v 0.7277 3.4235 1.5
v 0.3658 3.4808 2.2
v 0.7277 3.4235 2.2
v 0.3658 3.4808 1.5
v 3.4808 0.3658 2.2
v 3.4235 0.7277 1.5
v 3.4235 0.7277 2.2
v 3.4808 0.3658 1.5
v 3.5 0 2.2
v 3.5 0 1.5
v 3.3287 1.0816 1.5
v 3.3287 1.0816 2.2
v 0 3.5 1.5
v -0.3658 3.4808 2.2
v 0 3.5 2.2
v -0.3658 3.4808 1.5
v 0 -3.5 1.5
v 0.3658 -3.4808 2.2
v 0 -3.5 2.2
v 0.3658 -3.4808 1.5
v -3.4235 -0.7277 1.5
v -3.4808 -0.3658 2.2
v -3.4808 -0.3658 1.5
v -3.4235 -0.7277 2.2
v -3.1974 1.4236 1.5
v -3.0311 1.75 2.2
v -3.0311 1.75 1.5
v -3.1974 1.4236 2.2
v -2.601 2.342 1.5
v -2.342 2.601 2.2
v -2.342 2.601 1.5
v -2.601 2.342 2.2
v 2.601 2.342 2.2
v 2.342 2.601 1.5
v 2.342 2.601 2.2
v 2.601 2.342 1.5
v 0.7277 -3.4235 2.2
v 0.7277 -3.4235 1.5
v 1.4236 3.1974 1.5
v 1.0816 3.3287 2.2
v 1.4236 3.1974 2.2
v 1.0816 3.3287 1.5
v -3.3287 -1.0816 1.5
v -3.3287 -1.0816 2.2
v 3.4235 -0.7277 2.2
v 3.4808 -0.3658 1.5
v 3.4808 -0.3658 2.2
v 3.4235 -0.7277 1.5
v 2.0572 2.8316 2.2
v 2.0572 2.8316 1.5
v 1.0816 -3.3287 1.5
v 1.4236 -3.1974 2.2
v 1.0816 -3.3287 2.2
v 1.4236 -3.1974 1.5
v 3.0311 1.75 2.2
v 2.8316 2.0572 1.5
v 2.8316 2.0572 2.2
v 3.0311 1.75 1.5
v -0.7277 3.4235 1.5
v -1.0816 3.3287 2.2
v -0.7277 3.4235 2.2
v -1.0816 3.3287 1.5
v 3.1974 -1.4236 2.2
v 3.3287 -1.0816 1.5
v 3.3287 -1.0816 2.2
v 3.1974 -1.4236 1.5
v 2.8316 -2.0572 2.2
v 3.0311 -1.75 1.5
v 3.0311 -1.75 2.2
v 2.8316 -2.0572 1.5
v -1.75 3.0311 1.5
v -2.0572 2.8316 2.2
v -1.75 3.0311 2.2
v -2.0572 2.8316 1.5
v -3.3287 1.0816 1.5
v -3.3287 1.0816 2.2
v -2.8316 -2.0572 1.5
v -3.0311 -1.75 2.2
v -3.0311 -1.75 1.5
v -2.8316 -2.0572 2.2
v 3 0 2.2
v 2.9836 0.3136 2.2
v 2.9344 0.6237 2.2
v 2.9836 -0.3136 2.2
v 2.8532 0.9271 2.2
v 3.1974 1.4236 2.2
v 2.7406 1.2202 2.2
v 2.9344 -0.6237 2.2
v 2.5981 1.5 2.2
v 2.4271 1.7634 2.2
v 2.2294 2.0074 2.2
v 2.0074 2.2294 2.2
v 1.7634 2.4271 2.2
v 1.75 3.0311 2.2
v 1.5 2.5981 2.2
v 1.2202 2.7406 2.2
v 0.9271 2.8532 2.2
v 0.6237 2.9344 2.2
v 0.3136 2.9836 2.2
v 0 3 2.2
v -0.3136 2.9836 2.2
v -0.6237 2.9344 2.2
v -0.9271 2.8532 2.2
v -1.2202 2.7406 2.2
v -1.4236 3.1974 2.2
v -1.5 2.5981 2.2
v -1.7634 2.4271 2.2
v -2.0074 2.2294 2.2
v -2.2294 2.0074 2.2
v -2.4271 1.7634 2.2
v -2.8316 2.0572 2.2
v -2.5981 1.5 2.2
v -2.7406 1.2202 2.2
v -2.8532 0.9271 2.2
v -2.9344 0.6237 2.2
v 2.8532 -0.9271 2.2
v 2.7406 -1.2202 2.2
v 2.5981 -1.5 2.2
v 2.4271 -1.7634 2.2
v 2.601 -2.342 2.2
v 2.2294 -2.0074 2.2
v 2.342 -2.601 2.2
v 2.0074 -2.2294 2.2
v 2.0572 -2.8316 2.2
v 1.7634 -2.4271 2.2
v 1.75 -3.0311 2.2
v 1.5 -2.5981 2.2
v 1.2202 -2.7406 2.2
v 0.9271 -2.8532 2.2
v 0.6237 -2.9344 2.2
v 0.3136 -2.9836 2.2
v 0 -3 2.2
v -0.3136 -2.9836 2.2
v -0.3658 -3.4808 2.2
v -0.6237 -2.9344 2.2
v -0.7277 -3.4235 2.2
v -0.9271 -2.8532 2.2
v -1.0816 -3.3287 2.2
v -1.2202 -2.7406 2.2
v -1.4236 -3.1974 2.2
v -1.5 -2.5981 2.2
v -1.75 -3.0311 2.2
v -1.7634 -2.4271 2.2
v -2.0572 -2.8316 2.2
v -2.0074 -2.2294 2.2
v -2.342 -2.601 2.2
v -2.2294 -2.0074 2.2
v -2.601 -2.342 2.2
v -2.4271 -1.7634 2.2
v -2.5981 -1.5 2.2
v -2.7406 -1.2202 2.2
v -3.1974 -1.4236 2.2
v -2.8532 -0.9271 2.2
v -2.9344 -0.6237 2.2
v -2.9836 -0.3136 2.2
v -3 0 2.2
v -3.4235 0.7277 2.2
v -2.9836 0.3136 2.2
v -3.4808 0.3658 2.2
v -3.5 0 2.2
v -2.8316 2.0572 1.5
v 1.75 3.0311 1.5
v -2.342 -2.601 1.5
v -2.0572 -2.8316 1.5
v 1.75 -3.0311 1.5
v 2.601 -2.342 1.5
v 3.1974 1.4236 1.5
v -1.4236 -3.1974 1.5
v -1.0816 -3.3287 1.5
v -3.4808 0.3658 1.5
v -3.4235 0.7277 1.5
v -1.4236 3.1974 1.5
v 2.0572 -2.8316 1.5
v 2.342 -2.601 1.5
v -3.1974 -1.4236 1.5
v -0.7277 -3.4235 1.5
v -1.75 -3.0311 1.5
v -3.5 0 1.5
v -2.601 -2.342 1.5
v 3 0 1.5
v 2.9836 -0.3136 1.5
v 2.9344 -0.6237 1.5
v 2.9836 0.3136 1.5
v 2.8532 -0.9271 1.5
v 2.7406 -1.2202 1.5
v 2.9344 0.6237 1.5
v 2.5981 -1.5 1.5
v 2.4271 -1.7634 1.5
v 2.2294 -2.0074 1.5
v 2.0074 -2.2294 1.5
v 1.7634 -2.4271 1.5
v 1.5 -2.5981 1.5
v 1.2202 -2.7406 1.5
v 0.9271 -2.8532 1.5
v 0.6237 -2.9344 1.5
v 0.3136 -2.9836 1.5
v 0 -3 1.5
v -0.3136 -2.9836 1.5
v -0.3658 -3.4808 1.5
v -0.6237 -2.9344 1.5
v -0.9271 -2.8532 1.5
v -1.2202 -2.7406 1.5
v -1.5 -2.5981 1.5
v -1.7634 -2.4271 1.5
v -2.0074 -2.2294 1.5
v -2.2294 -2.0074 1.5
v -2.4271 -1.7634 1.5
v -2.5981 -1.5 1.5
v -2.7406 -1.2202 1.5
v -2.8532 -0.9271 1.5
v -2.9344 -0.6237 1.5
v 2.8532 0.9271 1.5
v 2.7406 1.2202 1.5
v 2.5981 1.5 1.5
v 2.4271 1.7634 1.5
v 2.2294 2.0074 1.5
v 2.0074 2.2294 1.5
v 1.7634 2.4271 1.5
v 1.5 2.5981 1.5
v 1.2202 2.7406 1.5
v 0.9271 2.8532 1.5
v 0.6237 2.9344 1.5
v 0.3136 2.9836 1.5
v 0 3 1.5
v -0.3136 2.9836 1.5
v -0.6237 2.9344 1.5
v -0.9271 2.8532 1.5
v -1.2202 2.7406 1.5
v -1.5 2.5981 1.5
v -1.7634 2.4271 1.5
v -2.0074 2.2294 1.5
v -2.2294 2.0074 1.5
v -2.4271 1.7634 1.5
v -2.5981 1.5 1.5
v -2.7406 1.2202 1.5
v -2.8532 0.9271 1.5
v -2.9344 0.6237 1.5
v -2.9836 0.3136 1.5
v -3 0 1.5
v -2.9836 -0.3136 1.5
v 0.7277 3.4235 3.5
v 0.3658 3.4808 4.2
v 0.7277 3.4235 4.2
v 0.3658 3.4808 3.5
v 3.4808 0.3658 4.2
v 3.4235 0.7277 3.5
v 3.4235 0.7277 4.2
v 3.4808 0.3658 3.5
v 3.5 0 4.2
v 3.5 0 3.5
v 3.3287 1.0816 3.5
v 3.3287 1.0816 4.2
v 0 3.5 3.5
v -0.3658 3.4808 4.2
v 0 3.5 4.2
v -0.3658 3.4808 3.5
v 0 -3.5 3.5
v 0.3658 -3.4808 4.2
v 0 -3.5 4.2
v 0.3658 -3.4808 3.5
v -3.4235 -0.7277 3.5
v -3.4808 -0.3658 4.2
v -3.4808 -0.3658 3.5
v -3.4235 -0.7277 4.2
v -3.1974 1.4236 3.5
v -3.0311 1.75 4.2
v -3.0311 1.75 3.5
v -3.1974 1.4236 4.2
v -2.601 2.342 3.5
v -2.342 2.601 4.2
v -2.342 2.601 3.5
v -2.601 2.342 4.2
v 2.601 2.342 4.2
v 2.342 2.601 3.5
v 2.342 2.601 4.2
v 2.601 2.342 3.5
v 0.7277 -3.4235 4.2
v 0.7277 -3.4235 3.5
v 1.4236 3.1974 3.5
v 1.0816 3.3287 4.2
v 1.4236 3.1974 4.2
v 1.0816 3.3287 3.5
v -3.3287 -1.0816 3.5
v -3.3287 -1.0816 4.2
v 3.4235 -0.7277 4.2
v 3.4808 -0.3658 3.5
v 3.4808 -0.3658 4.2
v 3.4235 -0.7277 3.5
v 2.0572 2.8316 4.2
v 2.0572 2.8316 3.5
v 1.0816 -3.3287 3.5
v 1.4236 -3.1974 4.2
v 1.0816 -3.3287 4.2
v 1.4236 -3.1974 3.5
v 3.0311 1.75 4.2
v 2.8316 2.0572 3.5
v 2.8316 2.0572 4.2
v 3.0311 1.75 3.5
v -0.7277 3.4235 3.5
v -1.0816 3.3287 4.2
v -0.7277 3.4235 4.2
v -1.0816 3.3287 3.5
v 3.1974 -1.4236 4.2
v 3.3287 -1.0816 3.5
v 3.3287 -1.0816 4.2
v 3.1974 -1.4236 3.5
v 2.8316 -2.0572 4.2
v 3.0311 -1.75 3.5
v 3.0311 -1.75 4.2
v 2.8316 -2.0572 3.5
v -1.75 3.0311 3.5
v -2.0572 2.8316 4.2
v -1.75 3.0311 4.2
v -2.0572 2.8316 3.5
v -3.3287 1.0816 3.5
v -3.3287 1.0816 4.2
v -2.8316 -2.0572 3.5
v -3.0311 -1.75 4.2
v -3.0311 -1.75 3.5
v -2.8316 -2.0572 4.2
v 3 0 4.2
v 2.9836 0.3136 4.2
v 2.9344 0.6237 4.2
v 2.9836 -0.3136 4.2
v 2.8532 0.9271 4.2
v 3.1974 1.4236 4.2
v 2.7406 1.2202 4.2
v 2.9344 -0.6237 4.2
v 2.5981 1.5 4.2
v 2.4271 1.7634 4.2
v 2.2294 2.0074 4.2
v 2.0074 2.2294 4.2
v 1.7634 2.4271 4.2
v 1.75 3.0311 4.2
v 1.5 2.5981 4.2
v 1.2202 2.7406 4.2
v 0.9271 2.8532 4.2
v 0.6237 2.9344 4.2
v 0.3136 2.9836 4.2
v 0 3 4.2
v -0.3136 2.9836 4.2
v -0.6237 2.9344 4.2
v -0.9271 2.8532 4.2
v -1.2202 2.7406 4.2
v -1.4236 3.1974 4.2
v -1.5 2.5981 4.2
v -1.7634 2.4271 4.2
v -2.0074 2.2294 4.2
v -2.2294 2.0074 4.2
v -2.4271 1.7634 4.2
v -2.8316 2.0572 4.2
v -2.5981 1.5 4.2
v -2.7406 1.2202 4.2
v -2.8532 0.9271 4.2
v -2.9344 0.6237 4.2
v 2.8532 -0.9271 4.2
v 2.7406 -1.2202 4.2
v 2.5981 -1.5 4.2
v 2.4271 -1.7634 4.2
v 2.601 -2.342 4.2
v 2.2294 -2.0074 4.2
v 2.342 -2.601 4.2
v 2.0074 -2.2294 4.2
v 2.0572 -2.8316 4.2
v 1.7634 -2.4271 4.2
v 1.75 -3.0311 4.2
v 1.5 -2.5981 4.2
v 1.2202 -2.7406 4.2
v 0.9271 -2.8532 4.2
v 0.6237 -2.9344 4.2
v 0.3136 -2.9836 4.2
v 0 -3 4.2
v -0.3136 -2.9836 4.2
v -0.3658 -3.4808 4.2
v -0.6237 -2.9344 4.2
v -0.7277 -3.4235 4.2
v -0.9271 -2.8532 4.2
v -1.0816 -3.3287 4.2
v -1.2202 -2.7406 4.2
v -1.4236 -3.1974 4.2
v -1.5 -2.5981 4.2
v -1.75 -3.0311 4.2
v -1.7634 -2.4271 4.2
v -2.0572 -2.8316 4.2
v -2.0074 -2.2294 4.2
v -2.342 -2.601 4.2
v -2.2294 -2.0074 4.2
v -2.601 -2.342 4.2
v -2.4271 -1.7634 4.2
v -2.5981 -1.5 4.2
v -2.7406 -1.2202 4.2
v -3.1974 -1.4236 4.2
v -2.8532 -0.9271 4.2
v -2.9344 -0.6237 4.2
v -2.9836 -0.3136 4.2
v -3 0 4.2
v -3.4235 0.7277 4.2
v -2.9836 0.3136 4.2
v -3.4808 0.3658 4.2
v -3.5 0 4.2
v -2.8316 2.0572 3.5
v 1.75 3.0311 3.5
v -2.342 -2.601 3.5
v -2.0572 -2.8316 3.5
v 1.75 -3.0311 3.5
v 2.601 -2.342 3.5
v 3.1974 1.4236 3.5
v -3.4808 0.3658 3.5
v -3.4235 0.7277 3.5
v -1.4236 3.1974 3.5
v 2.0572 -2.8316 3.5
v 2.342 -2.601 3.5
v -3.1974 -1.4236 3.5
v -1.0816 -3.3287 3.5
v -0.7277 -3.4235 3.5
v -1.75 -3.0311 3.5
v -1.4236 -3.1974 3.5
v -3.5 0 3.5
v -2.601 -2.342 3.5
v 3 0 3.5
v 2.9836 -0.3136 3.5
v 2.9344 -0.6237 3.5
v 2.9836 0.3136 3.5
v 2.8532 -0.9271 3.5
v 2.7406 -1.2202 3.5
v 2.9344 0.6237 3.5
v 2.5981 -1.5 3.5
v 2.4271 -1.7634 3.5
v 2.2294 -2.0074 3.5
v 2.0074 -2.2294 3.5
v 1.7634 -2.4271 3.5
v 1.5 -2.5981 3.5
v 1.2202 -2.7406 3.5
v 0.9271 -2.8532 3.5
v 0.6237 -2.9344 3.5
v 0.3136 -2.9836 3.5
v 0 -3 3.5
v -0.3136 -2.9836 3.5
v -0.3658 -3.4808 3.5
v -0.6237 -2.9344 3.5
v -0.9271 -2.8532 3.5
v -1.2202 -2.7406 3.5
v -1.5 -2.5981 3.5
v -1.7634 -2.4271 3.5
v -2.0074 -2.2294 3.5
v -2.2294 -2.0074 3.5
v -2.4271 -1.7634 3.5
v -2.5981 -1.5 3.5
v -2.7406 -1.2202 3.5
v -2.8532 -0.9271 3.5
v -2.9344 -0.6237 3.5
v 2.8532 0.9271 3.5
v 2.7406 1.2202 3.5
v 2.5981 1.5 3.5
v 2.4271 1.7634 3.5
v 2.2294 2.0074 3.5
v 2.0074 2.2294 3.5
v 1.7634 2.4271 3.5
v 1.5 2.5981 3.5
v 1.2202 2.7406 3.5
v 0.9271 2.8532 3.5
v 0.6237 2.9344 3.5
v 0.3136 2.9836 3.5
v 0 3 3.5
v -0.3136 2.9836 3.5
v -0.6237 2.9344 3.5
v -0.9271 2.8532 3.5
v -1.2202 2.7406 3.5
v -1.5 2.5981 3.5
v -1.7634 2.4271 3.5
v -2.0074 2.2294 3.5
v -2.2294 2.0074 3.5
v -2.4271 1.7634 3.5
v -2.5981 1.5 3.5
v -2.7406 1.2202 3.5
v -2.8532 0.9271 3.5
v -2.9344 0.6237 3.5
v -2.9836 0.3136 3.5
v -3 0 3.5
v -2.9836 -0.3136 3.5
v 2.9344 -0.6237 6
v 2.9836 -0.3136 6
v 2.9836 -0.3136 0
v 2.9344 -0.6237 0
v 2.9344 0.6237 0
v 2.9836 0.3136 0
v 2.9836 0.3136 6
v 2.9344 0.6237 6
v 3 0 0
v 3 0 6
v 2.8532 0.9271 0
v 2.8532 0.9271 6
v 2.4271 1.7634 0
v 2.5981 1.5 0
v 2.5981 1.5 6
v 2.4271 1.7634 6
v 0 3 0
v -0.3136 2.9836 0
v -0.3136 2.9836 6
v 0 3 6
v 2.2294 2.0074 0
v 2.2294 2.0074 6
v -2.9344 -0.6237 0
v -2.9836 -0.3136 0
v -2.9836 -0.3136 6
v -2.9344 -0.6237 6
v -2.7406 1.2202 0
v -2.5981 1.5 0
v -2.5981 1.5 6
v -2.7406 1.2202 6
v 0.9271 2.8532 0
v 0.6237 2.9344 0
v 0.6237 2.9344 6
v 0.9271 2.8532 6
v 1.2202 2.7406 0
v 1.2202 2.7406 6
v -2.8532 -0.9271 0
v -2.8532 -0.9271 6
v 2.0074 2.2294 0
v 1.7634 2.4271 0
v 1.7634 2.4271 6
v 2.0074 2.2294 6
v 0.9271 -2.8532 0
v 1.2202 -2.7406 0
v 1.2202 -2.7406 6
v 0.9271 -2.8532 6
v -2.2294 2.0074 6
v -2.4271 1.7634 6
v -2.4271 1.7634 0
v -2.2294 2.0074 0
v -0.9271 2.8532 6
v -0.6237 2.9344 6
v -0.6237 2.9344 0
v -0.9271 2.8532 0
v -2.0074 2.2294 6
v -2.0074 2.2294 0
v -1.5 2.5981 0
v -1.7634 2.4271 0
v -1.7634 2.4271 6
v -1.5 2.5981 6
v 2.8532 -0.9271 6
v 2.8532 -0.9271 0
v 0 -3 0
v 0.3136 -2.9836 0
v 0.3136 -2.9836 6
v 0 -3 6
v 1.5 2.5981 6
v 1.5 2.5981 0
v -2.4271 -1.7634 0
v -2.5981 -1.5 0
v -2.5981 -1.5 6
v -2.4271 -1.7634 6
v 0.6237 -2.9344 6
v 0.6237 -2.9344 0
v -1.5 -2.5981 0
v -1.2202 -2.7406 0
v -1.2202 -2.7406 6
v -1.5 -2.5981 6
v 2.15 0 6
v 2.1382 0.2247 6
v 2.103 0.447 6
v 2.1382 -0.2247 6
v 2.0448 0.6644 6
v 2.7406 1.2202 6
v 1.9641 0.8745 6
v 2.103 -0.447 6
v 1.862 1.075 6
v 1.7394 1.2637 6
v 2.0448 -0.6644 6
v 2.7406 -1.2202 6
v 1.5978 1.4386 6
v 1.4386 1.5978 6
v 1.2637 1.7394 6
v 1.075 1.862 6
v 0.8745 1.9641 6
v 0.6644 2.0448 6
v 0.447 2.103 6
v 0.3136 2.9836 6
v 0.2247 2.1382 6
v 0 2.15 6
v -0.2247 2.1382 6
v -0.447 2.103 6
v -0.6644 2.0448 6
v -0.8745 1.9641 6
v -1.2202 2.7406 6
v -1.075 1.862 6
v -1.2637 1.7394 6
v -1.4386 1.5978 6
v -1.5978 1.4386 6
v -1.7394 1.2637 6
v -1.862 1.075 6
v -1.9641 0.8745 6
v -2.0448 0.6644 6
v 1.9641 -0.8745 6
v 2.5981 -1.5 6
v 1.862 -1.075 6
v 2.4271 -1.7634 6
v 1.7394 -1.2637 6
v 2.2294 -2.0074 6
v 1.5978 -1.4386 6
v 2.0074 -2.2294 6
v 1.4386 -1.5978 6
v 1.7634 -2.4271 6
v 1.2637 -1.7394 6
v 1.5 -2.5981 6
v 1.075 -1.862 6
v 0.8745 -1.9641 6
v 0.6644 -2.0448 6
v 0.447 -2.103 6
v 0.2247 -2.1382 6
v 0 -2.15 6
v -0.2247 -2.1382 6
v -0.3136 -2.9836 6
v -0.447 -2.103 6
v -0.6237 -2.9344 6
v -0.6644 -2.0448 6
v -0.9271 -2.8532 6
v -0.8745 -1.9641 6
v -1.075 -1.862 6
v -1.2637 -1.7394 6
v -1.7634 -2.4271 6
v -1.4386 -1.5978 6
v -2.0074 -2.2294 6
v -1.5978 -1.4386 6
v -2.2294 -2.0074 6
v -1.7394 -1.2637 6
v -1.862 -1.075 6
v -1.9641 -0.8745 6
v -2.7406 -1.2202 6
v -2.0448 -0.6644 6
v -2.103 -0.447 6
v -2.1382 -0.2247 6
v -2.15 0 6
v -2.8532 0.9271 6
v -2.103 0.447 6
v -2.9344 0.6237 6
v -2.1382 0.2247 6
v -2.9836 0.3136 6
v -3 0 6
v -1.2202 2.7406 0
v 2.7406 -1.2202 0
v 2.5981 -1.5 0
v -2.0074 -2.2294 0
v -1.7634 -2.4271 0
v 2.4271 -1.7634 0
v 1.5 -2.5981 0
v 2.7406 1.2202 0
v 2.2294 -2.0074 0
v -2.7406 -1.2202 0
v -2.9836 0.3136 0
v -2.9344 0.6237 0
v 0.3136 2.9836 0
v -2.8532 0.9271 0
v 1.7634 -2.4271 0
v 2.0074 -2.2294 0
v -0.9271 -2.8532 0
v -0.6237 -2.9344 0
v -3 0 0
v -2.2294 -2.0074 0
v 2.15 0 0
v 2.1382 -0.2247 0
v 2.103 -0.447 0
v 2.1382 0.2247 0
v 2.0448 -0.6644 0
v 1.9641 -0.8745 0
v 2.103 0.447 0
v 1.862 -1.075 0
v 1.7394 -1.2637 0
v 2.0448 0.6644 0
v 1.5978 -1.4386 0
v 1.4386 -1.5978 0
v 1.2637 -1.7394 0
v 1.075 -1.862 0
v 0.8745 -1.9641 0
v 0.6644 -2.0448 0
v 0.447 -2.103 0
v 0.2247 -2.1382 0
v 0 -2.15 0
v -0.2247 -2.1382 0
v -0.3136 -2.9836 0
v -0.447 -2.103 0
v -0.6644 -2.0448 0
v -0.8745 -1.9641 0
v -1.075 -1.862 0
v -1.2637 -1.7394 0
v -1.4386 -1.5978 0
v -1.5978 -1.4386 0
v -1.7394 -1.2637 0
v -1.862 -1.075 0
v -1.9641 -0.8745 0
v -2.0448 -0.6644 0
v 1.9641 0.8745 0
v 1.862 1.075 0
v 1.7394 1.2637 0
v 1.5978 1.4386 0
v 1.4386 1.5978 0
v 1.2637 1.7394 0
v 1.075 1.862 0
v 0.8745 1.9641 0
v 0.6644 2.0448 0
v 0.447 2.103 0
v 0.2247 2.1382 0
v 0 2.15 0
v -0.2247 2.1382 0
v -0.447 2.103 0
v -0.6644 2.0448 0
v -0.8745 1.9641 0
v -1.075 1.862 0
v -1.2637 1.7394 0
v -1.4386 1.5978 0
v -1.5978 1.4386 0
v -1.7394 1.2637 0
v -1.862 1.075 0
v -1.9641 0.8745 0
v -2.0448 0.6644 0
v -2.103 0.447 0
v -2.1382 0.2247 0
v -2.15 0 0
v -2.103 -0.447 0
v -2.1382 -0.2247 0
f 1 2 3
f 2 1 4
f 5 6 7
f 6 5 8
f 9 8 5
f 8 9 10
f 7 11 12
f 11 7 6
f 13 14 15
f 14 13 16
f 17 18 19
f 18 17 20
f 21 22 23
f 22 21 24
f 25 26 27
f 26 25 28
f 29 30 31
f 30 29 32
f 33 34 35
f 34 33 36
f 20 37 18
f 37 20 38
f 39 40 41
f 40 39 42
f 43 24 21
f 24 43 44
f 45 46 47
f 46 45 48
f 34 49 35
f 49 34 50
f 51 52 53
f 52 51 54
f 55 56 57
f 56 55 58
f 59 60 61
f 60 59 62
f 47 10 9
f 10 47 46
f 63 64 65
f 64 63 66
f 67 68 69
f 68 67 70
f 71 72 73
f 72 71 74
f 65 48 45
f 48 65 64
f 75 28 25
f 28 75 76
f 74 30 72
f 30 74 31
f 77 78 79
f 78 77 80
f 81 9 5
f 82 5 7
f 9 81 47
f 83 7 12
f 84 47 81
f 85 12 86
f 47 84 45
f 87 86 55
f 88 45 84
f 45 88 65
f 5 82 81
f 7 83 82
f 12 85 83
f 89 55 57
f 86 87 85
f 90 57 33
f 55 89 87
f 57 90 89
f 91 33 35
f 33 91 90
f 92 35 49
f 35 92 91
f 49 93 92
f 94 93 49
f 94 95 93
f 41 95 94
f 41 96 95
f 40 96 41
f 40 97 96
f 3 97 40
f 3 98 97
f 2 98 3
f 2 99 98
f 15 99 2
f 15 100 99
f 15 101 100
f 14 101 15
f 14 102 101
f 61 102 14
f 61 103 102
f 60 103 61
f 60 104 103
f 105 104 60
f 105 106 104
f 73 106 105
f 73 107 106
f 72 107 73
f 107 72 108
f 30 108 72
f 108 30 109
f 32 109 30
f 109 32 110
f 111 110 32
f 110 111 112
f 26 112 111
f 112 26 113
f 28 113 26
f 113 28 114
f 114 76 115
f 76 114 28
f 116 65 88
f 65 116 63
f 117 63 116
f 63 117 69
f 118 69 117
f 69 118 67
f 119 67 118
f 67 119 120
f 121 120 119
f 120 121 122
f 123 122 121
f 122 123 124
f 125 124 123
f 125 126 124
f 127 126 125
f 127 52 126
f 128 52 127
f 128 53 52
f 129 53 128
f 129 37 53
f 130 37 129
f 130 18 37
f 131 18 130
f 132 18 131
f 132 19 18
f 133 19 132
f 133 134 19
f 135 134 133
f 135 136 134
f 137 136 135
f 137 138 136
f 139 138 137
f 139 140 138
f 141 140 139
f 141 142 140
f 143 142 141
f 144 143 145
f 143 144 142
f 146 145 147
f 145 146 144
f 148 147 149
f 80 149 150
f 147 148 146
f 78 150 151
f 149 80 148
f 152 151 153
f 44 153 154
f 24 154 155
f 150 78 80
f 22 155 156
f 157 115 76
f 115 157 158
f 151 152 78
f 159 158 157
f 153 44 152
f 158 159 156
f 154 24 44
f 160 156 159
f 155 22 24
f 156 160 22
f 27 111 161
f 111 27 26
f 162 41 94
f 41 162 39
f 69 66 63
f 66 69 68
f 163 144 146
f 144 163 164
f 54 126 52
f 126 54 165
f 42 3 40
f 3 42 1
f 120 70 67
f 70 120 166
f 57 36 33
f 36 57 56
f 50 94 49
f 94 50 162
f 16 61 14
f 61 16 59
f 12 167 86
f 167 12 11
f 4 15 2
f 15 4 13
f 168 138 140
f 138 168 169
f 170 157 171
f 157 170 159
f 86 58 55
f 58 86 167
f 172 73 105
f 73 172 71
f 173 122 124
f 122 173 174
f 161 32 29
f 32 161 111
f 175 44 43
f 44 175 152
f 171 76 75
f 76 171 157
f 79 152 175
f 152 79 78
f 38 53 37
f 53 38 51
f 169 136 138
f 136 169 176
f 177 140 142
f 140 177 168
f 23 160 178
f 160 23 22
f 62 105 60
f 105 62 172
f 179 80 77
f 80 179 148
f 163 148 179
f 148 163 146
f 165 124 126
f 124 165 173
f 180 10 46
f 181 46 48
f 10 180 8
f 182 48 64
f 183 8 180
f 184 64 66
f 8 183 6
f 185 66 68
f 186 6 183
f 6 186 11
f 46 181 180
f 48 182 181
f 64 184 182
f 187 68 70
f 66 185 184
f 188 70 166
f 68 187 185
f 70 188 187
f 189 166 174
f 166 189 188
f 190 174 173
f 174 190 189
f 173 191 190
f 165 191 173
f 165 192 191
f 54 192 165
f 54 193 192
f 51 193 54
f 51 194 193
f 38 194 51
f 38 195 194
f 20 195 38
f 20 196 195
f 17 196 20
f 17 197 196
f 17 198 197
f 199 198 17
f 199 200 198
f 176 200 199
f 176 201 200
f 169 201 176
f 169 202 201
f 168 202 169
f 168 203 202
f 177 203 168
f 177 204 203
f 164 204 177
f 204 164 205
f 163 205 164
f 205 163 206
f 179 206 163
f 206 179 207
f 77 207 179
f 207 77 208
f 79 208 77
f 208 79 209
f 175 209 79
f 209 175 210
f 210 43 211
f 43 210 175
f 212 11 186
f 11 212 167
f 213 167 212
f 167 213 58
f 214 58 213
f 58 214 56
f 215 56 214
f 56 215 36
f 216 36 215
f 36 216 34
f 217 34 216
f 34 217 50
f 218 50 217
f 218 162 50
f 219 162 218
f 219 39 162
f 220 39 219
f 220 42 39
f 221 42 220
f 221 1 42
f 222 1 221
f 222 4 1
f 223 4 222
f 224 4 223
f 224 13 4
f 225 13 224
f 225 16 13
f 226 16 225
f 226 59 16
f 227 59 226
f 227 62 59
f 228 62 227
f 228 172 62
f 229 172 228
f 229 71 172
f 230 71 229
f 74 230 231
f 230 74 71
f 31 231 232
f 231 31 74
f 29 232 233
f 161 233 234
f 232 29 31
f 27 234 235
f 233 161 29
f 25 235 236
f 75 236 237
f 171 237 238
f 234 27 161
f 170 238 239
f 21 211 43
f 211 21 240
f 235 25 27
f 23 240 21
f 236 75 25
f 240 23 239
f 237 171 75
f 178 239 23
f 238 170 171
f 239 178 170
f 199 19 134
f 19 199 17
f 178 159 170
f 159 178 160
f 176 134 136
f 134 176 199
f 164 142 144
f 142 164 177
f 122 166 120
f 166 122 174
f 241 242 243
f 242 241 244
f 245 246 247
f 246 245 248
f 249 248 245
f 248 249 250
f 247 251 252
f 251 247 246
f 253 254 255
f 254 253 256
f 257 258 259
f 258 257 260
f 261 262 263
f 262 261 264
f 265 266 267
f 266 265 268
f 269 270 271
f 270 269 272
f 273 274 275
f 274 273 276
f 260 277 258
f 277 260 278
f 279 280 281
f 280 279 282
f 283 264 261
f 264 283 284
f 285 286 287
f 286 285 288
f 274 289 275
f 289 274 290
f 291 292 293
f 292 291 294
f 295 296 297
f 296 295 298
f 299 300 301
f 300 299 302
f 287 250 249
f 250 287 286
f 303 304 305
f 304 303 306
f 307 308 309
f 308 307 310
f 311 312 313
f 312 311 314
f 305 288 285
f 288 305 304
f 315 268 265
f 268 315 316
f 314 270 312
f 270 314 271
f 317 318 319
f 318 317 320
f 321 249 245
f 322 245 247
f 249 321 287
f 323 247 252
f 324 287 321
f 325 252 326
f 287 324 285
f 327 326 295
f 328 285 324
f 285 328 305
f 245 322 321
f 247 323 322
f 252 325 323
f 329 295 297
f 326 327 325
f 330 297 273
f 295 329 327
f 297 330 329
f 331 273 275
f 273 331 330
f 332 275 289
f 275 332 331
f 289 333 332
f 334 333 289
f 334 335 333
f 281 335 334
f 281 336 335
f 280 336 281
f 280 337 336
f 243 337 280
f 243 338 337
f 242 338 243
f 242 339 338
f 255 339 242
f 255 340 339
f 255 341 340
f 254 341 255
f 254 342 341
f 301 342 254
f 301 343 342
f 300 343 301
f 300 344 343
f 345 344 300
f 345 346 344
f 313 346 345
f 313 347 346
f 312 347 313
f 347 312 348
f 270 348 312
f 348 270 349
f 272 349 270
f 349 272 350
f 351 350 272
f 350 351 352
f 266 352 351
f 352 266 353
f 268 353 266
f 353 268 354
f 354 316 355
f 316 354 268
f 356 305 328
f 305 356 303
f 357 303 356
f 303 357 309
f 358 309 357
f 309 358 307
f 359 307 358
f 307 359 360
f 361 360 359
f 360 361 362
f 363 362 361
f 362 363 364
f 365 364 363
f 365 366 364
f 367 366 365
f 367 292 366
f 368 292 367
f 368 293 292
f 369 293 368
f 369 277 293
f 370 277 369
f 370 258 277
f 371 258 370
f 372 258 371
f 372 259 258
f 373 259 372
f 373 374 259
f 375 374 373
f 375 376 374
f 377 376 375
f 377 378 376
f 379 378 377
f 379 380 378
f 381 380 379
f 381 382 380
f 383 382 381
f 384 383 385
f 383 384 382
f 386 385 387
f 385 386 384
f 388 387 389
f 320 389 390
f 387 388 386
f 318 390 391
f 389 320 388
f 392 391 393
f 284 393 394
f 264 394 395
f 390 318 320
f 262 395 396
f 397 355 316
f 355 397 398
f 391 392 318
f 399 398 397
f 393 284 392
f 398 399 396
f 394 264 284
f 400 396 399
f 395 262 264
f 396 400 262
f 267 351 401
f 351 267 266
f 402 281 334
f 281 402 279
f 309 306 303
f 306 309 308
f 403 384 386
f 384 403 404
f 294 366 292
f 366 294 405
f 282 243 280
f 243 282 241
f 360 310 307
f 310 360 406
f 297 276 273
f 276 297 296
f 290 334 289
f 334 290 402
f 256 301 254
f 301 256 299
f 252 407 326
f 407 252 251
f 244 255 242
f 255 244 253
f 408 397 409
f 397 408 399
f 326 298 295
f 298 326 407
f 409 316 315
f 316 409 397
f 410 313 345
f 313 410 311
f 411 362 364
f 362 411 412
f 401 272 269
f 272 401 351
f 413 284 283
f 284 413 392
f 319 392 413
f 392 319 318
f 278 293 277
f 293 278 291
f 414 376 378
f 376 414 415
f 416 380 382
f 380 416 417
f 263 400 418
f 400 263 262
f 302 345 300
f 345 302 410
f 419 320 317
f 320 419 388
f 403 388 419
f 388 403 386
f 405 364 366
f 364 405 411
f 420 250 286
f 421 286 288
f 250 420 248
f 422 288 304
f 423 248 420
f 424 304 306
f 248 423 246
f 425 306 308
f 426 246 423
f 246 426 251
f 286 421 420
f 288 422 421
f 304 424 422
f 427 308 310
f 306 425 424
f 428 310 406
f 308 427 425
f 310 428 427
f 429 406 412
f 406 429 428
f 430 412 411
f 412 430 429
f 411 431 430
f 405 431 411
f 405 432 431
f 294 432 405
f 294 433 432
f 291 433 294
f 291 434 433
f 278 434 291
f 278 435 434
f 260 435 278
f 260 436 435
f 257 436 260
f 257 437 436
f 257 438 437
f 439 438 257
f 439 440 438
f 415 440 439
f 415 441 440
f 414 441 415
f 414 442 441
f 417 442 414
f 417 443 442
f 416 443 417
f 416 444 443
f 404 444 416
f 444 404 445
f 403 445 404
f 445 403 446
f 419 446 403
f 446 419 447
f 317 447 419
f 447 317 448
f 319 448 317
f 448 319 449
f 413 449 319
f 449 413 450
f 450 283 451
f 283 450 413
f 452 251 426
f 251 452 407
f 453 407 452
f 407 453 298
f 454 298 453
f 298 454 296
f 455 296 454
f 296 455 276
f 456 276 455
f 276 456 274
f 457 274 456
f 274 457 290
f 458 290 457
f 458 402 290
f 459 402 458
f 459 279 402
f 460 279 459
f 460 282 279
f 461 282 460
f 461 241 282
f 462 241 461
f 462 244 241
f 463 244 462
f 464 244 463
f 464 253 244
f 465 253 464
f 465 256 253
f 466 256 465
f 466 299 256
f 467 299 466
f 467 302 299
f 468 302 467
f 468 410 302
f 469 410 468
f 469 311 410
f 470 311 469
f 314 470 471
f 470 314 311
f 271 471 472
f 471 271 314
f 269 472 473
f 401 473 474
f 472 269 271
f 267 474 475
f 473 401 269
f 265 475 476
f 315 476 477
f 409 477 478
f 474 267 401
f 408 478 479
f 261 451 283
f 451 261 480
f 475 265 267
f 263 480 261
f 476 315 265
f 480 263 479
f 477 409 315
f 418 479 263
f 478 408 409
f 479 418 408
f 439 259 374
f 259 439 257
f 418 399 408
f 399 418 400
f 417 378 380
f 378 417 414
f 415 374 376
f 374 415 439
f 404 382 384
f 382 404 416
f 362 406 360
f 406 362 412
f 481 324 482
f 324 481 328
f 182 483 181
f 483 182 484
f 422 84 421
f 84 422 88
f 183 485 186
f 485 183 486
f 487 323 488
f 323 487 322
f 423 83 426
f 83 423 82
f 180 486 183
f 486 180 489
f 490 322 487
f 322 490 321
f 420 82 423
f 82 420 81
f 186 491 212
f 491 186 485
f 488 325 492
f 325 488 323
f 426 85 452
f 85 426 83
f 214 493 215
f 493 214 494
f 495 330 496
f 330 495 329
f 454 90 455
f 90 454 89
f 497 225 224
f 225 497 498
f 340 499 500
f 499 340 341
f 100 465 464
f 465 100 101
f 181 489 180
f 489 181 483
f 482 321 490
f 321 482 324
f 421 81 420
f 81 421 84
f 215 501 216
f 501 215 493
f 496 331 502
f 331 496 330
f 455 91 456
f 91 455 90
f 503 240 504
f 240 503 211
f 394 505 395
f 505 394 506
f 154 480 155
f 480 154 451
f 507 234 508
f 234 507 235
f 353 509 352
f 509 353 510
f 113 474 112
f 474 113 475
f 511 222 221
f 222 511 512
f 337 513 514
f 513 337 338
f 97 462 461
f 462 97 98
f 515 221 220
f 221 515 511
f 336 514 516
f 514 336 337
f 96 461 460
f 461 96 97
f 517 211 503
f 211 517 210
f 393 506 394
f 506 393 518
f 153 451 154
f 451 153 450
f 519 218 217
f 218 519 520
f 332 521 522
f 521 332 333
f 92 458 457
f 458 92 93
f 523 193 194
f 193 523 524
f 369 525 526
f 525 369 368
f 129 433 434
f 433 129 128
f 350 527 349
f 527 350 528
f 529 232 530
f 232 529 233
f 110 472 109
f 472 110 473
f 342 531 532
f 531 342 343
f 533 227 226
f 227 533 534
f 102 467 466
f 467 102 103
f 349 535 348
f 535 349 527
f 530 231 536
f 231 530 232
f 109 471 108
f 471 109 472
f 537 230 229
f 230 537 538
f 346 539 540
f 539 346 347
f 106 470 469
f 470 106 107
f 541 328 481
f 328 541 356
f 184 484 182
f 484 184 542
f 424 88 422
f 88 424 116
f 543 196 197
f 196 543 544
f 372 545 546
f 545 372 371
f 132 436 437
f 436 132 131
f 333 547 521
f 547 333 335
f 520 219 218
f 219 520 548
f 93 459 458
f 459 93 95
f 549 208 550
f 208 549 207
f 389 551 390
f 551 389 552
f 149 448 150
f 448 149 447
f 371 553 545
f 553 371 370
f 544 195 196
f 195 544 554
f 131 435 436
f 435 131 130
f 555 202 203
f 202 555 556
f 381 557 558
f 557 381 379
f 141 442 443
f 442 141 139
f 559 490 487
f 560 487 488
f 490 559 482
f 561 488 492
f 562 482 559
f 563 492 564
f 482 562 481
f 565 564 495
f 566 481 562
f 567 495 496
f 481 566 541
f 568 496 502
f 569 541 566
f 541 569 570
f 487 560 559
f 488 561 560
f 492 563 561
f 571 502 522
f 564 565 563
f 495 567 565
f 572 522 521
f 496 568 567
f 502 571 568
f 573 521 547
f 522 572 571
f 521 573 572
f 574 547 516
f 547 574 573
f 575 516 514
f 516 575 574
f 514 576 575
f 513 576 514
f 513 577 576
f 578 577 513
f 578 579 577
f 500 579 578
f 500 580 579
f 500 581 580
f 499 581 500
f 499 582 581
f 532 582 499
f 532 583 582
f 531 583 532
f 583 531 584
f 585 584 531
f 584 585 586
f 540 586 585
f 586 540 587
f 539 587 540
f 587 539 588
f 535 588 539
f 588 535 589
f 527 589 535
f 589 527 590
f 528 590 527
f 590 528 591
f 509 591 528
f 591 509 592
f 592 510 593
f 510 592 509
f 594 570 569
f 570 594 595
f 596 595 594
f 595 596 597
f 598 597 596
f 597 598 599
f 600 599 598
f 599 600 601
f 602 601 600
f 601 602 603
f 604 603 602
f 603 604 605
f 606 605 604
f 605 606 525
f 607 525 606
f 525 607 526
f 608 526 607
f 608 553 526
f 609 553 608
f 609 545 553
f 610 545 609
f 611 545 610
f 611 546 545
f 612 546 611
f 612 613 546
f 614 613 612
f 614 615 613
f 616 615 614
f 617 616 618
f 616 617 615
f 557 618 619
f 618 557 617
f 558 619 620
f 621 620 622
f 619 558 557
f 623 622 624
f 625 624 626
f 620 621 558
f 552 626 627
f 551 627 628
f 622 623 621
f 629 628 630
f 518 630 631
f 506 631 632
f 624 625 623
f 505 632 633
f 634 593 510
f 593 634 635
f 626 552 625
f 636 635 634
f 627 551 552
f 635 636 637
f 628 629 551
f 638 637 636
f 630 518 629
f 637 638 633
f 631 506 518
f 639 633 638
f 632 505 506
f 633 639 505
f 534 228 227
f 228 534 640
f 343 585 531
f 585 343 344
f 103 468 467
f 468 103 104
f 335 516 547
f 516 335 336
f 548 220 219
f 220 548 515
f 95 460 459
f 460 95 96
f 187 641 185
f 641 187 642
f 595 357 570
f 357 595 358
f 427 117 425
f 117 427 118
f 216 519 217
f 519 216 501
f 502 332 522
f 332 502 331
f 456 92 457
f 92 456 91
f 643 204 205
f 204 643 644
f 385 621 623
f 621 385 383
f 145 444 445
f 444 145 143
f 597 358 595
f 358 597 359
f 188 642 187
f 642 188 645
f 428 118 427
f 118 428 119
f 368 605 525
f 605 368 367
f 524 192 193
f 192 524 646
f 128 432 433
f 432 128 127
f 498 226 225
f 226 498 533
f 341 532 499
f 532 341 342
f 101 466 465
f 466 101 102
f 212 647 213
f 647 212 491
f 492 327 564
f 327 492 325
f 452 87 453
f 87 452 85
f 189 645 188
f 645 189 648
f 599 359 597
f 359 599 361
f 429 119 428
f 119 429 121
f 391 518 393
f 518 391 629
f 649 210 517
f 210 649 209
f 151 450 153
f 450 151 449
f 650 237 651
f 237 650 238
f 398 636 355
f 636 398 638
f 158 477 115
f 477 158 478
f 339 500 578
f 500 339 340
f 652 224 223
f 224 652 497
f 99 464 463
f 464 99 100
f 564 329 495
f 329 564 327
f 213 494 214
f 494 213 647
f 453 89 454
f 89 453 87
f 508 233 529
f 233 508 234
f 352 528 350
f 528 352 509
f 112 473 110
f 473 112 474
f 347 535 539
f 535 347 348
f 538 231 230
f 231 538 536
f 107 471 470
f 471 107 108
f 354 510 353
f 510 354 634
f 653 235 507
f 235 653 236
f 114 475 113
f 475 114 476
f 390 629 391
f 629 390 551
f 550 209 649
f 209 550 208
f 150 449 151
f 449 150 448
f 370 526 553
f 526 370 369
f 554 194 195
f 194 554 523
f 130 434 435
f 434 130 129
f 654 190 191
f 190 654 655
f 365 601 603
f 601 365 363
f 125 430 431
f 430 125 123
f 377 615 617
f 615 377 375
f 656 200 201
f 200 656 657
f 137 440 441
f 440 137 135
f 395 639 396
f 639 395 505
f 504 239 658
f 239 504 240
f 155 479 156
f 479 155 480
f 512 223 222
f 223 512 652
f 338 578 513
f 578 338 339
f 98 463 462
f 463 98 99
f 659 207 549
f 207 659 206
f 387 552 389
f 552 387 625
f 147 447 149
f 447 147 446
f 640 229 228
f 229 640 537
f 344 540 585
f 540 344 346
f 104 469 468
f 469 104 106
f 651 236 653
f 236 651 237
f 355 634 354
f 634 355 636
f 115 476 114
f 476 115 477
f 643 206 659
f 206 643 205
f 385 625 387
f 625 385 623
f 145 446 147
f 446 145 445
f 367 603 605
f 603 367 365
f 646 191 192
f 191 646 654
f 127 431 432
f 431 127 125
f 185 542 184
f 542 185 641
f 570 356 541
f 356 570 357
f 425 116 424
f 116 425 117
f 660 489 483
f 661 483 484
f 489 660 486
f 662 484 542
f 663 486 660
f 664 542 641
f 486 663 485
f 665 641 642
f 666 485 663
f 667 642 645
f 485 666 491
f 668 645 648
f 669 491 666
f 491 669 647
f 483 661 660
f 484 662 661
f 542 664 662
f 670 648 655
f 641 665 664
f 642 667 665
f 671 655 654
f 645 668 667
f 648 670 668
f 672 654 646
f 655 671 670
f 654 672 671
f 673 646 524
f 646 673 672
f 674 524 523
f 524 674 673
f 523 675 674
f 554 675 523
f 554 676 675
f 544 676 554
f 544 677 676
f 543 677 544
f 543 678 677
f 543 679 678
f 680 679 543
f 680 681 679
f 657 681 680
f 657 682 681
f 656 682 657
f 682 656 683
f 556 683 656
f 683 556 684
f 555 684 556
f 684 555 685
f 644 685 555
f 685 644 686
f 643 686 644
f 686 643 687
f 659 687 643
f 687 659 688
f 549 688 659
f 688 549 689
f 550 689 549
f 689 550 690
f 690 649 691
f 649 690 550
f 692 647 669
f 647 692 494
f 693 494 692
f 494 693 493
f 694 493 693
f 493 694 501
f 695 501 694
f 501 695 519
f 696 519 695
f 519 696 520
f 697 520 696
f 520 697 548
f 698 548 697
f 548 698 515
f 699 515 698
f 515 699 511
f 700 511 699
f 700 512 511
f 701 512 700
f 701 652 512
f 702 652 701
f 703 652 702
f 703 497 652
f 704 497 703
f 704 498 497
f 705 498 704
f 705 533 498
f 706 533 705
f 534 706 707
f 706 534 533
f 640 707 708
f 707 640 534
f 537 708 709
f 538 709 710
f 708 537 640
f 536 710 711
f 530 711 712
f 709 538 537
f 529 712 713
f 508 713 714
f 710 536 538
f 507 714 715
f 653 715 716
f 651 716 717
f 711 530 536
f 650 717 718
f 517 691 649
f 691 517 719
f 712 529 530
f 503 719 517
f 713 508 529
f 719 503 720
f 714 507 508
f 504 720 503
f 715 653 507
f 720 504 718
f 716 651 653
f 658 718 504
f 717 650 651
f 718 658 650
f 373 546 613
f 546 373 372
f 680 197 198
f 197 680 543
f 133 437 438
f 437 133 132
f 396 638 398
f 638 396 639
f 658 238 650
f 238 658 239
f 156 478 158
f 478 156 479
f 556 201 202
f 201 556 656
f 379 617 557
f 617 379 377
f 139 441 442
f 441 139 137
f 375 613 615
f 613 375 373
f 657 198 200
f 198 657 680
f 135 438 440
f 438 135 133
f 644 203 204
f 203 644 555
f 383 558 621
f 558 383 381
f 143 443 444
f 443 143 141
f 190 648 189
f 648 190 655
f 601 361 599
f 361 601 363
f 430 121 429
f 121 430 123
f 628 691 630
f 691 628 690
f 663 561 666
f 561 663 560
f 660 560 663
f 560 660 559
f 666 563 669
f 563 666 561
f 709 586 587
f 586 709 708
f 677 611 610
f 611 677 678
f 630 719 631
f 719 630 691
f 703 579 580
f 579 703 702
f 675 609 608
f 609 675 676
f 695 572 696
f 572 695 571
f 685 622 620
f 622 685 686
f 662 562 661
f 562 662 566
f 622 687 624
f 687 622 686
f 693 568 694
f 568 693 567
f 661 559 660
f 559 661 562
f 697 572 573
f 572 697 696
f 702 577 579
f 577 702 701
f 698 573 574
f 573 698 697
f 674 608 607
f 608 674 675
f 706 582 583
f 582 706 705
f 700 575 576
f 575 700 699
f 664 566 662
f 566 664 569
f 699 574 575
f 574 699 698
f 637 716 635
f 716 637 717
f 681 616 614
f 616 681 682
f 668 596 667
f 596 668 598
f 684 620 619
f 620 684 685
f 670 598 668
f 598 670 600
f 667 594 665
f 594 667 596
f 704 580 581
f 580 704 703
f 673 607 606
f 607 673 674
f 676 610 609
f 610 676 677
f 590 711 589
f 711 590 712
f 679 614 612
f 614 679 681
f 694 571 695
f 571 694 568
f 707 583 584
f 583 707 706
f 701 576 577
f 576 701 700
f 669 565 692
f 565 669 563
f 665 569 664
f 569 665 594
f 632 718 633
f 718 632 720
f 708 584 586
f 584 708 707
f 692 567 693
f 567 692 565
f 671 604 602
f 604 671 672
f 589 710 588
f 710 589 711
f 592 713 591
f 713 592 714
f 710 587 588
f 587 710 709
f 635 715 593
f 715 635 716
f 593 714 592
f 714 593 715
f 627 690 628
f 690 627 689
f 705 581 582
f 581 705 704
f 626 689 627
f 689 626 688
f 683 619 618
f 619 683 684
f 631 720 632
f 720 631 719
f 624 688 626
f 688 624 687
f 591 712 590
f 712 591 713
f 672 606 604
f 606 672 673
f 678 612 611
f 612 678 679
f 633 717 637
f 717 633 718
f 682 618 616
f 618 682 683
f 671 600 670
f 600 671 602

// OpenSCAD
// Heat-set insert, simplified ribbed geometry.
$fn = 60;
eps = 0.02;
inner_d = 4.3;
outer_d = 6;
length = 6;
difference() {
    union() {
        cylinder(d=outer_d,h=length);
        for(z=[1.5:2:length-1]) translate([0,0,z]) cylinder(d=outer_d+1,h=0.7);
    }
    translate([0,0,-eps]) cylinder(d=inner_d,h=length+2*eps);
}
